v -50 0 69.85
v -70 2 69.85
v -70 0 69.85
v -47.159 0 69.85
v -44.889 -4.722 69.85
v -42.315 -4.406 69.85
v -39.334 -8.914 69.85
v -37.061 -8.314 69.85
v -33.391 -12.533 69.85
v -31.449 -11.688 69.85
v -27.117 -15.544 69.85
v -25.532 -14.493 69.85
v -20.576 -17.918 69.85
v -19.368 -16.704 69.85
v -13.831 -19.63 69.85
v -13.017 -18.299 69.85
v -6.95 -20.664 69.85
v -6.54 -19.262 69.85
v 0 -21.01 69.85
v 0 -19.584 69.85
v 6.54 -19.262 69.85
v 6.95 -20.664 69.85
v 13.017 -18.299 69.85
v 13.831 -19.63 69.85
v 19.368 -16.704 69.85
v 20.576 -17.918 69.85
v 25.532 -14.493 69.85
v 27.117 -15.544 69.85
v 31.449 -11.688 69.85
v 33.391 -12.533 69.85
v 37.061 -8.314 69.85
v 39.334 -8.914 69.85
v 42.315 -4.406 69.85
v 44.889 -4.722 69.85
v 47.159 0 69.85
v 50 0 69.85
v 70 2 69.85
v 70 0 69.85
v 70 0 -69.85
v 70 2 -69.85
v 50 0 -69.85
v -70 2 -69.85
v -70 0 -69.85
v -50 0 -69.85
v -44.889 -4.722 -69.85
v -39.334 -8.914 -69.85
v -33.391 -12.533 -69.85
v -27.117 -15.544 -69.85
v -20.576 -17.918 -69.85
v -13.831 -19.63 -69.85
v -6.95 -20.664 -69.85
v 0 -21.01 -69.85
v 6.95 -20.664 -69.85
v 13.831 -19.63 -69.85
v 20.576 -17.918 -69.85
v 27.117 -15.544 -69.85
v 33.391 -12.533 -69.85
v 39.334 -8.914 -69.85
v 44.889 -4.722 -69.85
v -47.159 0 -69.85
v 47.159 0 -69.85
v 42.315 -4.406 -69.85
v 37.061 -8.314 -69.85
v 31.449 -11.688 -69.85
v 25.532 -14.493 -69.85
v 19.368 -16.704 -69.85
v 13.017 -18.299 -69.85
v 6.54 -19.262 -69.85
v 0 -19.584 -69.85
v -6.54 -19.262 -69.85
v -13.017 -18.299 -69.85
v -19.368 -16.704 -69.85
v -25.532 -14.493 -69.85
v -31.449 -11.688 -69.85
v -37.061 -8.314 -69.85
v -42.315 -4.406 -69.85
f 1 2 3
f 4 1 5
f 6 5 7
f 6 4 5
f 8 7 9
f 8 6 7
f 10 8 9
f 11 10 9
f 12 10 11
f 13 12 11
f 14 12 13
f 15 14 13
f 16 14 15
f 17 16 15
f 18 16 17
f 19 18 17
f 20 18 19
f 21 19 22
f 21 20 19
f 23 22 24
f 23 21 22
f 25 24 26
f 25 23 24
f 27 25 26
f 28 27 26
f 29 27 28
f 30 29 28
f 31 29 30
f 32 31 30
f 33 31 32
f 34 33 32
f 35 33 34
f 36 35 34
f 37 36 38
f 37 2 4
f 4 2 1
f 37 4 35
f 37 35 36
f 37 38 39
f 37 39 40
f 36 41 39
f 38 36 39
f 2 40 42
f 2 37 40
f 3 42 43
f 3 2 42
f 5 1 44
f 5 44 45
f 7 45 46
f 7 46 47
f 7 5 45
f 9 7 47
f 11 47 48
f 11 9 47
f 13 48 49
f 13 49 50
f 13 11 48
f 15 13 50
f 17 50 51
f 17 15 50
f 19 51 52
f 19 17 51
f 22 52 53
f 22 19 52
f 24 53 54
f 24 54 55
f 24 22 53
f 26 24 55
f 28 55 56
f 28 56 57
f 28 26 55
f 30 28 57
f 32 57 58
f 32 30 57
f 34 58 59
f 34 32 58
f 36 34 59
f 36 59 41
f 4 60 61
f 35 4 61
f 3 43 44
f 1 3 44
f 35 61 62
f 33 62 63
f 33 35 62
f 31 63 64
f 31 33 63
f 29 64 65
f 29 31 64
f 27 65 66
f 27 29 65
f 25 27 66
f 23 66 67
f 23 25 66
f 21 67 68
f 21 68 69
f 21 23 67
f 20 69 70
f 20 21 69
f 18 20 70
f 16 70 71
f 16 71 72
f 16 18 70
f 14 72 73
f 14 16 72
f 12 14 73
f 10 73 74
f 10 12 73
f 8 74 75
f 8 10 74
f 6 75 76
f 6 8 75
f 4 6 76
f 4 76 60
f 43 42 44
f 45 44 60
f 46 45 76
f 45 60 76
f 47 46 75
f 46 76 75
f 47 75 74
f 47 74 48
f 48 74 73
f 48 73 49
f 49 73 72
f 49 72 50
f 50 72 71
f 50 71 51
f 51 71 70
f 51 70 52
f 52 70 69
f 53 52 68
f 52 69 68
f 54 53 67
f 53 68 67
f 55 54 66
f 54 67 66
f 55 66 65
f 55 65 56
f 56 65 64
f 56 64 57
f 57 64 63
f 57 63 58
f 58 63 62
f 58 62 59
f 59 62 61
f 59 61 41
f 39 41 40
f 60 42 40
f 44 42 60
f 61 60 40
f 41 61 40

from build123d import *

# Parameters (mm, degrees)
F1_DEPTH = 69.85


with BuildPart() as f1:
    # F0 (on Top) → F1 (new body, symmetric)
    with BuildSketch(Plane.XY):
        with BuildLine():
            Line((-70, 0), (-50, 0))
            ThreePointArc((-50, 0), (0, -21.010205), (50, 0))
            Line((50, 0), (70, 0))
            Line((70, 0), (70, 2))
            Line((70, 2), (-70, 2))
            Line((-70, 2), (-70, 0))
        make_face()
        with BuildLine():
            ThreePointArc((47.159304, 0), (0, -19.58378), (-47.159304, 0))
            Line((-47.159304, 0), (47.159304, 0))
        make_face(mode=Mode.SUBTRACT)
    extrude(amount=F1_DEPTH, both=True)


solid = f1.part
